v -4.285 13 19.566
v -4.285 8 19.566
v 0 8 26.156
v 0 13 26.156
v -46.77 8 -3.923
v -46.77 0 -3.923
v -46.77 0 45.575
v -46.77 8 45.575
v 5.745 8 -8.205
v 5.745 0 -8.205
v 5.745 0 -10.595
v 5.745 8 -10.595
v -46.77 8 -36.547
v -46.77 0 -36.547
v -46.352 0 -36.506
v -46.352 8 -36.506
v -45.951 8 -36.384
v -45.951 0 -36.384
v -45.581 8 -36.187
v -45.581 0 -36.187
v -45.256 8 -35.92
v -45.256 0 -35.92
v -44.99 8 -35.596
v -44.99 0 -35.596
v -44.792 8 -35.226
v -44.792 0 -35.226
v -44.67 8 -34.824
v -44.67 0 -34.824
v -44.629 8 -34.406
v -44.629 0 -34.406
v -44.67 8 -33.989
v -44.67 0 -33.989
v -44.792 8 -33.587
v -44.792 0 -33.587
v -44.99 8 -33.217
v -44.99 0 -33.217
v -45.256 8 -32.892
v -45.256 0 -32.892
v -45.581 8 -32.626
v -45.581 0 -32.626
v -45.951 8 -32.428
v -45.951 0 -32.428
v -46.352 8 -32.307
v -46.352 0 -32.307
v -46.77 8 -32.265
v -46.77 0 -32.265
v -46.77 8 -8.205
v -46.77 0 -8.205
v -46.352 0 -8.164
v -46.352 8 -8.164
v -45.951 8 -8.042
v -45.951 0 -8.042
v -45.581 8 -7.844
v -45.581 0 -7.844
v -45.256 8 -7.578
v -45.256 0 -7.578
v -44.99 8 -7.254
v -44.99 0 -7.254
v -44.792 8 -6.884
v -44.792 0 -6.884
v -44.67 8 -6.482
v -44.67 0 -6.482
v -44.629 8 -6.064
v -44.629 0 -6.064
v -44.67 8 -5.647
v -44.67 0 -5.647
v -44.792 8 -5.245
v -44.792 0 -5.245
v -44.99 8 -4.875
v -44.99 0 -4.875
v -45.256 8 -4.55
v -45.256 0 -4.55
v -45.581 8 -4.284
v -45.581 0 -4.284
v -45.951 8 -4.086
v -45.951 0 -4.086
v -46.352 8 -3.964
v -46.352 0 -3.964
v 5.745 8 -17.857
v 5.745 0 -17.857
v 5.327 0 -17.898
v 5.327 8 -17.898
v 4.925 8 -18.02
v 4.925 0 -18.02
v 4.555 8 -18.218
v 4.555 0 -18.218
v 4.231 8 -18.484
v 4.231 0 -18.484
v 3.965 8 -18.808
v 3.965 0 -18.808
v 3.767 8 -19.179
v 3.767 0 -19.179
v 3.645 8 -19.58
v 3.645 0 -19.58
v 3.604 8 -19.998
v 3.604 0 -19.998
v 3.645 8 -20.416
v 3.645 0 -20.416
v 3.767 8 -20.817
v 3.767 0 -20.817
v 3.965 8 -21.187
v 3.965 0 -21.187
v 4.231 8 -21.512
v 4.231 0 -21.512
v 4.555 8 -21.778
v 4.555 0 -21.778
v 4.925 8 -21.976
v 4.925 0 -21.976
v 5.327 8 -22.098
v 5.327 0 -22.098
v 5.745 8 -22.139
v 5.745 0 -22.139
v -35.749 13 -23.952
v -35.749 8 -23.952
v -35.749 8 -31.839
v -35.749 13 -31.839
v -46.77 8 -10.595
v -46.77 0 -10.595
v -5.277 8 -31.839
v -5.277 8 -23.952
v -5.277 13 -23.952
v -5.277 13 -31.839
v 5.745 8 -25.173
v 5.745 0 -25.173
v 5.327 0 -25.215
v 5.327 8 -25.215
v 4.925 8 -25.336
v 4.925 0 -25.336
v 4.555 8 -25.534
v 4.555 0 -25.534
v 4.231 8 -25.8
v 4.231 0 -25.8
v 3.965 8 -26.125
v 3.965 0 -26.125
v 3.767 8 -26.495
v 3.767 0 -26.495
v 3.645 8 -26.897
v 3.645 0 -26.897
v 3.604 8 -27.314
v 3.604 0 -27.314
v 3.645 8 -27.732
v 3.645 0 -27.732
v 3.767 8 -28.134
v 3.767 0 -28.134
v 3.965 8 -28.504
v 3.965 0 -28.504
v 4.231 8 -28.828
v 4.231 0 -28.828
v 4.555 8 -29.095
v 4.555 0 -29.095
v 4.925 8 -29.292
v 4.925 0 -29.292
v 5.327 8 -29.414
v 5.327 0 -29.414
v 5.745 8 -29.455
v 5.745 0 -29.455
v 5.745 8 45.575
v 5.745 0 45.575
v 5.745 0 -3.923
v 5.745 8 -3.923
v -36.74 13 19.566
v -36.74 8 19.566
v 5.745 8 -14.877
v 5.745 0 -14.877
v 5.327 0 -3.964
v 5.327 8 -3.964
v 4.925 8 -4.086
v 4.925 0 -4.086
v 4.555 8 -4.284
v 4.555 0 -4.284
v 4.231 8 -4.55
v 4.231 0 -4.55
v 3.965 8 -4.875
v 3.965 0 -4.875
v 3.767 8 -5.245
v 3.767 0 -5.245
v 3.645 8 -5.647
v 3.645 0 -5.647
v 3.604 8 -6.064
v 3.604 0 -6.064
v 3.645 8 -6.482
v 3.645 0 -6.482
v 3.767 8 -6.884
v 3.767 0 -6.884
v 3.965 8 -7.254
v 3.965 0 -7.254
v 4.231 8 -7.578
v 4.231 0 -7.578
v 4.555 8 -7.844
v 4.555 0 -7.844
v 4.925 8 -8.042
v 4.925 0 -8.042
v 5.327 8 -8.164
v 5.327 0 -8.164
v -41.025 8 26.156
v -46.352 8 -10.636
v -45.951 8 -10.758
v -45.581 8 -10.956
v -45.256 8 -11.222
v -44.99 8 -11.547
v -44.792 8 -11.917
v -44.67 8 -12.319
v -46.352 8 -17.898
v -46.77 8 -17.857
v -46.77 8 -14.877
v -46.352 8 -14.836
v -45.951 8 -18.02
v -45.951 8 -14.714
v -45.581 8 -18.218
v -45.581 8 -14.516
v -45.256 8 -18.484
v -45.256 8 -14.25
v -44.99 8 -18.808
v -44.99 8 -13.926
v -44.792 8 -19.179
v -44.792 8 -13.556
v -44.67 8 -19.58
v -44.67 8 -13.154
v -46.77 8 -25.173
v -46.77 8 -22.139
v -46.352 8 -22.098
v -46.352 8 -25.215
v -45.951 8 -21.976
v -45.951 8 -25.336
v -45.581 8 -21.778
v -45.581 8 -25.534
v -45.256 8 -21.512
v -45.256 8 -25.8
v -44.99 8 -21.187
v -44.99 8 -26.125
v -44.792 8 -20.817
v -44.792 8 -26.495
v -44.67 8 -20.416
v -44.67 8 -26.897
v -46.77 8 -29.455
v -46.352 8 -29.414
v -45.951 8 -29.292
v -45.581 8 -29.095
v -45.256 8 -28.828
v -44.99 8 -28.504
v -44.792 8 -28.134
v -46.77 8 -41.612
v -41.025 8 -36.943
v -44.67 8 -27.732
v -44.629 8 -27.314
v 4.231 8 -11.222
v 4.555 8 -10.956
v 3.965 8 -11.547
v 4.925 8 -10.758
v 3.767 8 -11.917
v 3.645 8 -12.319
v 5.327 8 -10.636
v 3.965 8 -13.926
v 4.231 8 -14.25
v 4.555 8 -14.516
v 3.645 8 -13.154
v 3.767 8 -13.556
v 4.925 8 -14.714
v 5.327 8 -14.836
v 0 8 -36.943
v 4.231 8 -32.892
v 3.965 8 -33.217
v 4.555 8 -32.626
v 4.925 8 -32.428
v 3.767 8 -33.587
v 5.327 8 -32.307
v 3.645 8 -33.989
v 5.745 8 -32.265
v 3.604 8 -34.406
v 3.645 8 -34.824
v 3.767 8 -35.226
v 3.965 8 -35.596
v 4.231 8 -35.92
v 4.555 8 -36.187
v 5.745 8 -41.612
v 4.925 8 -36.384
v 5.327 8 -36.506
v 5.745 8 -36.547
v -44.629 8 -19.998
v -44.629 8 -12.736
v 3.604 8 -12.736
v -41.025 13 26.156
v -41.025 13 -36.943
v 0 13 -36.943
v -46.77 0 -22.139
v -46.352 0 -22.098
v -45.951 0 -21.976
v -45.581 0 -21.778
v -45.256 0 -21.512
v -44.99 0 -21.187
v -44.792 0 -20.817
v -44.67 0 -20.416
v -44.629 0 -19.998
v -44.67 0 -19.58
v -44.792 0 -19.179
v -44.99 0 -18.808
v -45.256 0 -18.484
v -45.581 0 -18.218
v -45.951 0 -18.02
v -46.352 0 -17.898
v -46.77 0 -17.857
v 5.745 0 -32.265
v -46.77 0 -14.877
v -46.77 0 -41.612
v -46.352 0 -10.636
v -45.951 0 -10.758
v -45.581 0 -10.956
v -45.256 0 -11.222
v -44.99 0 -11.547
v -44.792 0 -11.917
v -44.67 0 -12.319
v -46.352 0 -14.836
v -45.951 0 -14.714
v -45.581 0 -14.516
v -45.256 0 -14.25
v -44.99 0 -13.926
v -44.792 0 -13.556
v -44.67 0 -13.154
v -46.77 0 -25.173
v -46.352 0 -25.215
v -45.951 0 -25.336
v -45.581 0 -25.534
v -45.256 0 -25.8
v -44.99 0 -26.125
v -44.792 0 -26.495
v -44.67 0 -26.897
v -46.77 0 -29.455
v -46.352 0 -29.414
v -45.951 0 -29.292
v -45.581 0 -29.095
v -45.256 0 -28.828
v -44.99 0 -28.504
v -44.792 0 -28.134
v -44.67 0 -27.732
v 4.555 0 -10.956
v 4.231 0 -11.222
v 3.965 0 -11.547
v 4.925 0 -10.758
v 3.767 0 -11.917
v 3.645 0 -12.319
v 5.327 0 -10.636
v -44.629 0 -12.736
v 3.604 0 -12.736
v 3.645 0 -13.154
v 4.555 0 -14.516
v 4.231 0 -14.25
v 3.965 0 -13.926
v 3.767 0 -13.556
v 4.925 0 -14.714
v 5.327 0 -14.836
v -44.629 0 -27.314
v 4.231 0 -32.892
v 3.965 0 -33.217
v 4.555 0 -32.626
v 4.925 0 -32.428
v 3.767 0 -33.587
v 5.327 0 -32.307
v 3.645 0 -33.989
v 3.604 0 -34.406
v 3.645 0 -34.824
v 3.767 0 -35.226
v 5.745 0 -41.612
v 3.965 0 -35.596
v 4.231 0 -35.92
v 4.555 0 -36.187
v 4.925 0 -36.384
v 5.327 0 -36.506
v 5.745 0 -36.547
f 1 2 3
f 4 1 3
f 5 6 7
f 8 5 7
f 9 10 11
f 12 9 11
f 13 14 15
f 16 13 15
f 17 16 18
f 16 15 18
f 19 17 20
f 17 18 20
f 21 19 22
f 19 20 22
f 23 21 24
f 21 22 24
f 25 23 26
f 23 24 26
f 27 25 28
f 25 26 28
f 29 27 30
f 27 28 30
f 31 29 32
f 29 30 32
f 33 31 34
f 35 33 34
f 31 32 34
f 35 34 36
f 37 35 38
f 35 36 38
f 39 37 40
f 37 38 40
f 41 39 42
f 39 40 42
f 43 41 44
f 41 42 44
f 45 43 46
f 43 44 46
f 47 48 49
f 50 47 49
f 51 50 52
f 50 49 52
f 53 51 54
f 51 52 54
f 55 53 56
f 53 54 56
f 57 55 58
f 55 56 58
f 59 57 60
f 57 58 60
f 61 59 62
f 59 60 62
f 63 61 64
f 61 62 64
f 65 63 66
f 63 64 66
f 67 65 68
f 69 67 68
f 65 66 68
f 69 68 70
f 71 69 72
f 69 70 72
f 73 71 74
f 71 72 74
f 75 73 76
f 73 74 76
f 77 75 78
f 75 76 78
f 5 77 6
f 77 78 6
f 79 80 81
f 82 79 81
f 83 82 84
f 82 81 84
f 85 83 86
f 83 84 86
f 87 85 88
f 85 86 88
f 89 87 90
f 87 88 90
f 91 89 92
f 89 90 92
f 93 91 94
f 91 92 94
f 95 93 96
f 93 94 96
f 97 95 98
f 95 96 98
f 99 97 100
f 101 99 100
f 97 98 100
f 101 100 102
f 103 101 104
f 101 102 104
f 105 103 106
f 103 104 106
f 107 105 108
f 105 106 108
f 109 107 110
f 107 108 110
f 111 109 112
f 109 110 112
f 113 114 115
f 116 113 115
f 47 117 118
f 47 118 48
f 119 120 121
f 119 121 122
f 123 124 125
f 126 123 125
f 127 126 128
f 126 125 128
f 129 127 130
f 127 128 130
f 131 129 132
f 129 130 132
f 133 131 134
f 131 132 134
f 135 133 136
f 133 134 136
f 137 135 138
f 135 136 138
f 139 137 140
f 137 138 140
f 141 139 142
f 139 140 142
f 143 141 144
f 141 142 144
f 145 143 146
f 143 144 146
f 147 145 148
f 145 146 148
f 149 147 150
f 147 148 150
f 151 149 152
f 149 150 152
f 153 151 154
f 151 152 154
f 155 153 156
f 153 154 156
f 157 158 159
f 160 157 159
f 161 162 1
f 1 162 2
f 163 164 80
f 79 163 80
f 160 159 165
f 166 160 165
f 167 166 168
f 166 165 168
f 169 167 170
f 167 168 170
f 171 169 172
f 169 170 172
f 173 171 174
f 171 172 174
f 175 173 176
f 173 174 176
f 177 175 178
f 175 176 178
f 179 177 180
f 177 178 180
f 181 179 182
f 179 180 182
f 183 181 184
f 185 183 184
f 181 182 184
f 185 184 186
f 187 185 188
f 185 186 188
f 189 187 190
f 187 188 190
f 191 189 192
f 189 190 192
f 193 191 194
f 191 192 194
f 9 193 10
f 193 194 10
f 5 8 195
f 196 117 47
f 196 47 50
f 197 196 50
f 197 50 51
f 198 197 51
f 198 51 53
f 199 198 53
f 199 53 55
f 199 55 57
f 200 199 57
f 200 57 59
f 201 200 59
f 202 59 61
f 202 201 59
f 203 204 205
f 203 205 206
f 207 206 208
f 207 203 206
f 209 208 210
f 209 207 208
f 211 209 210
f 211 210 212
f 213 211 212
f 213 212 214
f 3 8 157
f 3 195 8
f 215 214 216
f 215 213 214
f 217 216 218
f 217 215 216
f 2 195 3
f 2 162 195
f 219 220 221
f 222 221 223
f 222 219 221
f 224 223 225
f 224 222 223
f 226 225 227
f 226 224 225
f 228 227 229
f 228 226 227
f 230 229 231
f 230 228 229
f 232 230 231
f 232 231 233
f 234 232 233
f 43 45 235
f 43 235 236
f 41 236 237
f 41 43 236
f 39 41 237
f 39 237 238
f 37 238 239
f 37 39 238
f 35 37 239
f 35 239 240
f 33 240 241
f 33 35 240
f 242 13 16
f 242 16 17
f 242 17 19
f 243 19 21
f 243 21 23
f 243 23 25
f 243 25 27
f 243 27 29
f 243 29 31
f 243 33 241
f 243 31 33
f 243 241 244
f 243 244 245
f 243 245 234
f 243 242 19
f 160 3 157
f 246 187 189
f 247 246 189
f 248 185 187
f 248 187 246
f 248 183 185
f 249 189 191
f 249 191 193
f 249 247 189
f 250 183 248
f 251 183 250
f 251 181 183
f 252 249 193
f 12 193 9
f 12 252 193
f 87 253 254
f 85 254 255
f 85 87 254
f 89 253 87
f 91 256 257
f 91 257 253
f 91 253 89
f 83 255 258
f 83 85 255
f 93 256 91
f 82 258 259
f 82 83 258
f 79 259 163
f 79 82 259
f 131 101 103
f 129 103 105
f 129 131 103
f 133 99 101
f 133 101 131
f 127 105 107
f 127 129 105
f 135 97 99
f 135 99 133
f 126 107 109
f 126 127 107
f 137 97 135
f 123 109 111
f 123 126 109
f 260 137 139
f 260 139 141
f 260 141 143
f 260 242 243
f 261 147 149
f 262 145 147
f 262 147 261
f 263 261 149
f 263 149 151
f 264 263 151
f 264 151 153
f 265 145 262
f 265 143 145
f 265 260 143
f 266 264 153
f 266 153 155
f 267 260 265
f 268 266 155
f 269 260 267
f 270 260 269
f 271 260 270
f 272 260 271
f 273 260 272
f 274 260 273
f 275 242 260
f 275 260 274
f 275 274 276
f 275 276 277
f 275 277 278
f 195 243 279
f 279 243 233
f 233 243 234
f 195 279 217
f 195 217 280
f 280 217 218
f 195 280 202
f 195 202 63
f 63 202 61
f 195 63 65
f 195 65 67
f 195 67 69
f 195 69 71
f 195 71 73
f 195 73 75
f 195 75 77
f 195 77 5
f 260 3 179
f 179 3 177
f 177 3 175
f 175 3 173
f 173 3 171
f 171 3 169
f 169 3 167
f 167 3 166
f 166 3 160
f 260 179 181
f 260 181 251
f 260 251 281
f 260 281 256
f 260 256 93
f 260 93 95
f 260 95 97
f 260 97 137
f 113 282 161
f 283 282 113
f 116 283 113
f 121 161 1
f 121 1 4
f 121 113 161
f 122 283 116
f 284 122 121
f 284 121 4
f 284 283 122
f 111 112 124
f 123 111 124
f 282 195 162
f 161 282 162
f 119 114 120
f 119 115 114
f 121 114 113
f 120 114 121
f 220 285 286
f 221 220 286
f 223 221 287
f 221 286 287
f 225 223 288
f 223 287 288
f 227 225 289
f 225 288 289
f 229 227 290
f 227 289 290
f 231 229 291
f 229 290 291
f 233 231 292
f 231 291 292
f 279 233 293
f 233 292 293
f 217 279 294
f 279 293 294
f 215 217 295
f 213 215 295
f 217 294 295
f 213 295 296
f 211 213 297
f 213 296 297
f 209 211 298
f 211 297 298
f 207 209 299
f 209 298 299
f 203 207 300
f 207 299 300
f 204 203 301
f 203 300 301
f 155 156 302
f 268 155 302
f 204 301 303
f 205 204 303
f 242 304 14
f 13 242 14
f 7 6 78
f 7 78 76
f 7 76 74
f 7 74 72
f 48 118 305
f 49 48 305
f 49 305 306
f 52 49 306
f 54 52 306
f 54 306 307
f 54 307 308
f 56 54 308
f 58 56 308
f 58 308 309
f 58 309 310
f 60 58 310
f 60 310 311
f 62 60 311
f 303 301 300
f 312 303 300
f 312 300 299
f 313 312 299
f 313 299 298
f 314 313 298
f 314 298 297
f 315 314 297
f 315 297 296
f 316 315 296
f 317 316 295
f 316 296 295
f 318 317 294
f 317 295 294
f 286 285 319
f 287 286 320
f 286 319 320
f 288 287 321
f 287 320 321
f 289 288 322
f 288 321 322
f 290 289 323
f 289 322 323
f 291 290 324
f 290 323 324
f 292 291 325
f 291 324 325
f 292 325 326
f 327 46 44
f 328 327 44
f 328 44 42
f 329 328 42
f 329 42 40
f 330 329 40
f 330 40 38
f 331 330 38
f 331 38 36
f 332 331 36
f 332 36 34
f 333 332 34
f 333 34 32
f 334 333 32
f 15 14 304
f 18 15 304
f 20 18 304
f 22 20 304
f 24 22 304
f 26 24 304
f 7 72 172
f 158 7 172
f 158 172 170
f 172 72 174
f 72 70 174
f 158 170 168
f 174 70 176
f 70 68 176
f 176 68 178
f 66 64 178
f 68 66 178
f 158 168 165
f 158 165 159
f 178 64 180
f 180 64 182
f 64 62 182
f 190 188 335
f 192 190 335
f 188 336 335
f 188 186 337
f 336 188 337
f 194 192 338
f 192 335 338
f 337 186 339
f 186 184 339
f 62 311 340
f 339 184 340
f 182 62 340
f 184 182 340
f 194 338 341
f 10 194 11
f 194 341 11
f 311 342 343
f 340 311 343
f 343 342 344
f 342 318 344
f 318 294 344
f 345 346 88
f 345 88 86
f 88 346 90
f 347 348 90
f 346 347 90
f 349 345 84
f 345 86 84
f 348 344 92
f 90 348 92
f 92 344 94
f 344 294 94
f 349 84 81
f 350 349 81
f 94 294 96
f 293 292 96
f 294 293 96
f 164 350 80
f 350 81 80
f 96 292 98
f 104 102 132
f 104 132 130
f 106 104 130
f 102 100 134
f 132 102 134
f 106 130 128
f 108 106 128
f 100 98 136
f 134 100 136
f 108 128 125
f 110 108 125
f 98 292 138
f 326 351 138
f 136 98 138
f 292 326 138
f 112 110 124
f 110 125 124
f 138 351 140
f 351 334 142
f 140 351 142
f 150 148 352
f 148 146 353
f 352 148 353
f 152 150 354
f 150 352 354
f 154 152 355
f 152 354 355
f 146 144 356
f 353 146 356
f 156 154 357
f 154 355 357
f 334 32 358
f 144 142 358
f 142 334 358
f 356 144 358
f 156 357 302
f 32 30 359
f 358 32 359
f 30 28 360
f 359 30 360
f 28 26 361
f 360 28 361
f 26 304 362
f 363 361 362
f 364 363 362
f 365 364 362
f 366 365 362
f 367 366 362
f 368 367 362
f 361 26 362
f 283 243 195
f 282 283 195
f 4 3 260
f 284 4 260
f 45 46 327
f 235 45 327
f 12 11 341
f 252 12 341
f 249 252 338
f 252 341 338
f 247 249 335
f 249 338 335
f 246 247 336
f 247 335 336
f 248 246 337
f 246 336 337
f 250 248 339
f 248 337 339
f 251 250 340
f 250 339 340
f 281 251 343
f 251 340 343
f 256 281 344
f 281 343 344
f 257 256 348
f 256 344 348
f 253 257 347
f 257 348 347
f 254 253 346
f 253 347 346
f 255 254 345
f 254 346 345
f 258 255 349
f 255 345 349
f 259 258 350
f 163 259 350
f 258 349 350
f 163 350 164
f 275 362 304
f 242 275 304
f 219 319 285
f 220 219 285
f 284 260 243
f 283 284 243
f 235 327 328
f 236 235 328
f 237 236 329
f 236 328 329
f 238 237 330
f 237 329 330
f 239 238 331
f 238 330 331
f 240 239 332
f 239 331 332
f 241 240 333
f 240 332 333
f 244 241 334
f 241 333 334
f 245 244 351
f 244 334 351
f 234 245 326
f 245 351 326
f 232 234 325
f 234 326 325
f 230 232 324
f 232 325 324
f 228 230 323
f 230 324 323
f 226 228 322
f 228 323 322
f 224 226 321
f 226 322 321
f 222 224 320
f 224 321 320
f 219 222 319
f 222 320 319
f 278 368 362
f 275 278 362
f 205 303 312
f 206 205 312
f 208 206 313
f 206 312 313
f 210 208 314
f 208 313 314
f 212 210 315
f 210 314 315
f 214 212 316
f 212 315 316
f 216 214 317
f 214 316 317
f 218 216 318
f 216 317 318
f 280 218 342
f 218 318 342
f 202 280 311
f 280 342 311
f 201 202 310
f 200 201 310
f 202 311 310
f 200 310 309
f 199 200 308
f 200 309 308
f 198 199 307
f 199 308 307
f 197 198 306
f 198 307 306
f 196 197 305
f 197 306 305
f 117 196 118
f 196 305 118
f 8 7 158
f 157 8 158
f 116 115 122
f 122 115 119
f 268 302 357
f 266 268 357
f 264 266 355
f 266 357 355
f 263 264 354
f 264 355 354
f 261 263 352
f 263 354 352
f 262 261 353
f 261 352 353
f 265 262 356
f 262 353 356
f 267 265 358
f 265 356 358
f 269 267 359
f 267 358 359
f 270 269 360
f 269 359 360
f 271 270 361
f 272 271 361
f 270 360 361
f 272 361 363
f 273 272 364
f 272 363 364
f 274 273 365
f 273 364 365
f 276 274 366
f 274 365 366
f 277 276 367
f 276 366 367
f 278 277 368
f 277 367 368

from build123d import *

# Parameters (mm, degrees)
BOSS_EXTRUDE1_DEPTH = 8
SKETCH2_W           = 30.471838297
SKETCH2_H           = 7.887355033
BOSS_EXTRUDE2_DEPTH = 13


with BuildPart() as part:
    # Sketch1 → Boss-Extrude1 (new body)
    with BuildSketch(Plane(origin=(0, 0, 0), x_dir=(1, 0, 0), z_dir=(0, 1, 0))):
        with BuildLine():
            Line((5.74475938, 41.611912647), (-46.770116697, 41.611912647))
            Line((-46.770116697, 41.611912647), (-46.770116697, 36.54735623))
            ThreePointArc((-46.770116697, 36.54735623), (-44.629147114, 34.406386647), (-46.770116697, 32.265417064))
            Line((-46.770116697, 32.265417064), (-46.770116697, 29.455346126))
            ThreePointArc((-46.770116697, 29.455346126), (-44.629147114, 27.314376543), (-46.770116697, 25.173406959))
            Line((-46.770116697, 25.173406959), (-46.770116697, 22.138808466))
            ThreePointArc((-46.770116697, 22.138808466), (-44.629147114, 19.997838883), (-46.770116697, 17.8568693))
            Line((-46.770116697, 17.8568693), (-46.770116697, 14.877282368))
            ThreePointArc((-46.770116697, 14.877282368), (-44.629147114, 12.736312785), (-46.770116697, 10.595343202))
            Line((-46.770116697, 10.595343202), (-46.770116697, 8.20529307))
            ThreePointArc((-46.770116697, 8.20529307), (-44.629147114, 6.064323487), (-46.770116697, 3.923353904))
            Line((-46.770116697, 3.923353904), (-46.770116697, -45.574951946))
            Line((-46.770116697, -45.574951946), (5.74475938, -45.574951946))
            Line((5.74475938, -45.574951946), (5.74475938, 3.923353904))
            ThreePointArc((5.74475938, 3.923353904), (3.603789797, 6.064323487), (5.74475938, 8.20529307))
            Line((5.74475938, 8.20529307), (5.74475938, 10.595343202))
            ThreePointArc((5.74475938, 10.595343202), (3.603789797, 12.736312785), (5.74475938, 14.877282368))
            Line((5.74475938, 14.877282368), (5.74475938, 17.8568693))
            ThreePointArc((5.74475938, 17.8568693), (3.603789797, 19.997838883), (5.74475938, 22.138808466))
            Line((5.74475938, 22.138808466), (5.74475938, 25.173406959))
            ThreePointArc((5.74475938, 25.173406959), (3.603789797, 27.314376543), (5.74475938, 29.455346126))
            Line((5.74475938, 29.455346126), (5.74475938, 32.265417064))
            ThreePointArc((5.74475938, 32.265417064), (3.603789797, 34.406386647), (5.74475938, 36.54735623))
            Line((5.74475938, 36.54735623), (5.74475938, 41.611912647))
        make_face()
    extrude(amount=BOSS_EXTRUDE1_DEPTH)

    # Sketch2 → Boss-Extrude2 (add)
    with BuildSketch(Plane(origin=(0, 0, 0), x_dir=(1, 0, 0), z_dir=(0, 1, 0))):
        Polygon((-41.025357317, 36.942692964), (-41.025357317, -26.156147295), (-36.740368518, -19.565642265), (-4.284988799, -19.565642265), (0, -26.156147295), (0, 36.942692964), align=None)
        with Locations((-20.512678659, 27.89543278)):
            Rectangle(SKETCH2_W, SKETCH2_H, mode=Mode.SUBTRACT)
    extrude(amount=BOSS_EXTRUDE2_DEPTH)


solid = part.part
